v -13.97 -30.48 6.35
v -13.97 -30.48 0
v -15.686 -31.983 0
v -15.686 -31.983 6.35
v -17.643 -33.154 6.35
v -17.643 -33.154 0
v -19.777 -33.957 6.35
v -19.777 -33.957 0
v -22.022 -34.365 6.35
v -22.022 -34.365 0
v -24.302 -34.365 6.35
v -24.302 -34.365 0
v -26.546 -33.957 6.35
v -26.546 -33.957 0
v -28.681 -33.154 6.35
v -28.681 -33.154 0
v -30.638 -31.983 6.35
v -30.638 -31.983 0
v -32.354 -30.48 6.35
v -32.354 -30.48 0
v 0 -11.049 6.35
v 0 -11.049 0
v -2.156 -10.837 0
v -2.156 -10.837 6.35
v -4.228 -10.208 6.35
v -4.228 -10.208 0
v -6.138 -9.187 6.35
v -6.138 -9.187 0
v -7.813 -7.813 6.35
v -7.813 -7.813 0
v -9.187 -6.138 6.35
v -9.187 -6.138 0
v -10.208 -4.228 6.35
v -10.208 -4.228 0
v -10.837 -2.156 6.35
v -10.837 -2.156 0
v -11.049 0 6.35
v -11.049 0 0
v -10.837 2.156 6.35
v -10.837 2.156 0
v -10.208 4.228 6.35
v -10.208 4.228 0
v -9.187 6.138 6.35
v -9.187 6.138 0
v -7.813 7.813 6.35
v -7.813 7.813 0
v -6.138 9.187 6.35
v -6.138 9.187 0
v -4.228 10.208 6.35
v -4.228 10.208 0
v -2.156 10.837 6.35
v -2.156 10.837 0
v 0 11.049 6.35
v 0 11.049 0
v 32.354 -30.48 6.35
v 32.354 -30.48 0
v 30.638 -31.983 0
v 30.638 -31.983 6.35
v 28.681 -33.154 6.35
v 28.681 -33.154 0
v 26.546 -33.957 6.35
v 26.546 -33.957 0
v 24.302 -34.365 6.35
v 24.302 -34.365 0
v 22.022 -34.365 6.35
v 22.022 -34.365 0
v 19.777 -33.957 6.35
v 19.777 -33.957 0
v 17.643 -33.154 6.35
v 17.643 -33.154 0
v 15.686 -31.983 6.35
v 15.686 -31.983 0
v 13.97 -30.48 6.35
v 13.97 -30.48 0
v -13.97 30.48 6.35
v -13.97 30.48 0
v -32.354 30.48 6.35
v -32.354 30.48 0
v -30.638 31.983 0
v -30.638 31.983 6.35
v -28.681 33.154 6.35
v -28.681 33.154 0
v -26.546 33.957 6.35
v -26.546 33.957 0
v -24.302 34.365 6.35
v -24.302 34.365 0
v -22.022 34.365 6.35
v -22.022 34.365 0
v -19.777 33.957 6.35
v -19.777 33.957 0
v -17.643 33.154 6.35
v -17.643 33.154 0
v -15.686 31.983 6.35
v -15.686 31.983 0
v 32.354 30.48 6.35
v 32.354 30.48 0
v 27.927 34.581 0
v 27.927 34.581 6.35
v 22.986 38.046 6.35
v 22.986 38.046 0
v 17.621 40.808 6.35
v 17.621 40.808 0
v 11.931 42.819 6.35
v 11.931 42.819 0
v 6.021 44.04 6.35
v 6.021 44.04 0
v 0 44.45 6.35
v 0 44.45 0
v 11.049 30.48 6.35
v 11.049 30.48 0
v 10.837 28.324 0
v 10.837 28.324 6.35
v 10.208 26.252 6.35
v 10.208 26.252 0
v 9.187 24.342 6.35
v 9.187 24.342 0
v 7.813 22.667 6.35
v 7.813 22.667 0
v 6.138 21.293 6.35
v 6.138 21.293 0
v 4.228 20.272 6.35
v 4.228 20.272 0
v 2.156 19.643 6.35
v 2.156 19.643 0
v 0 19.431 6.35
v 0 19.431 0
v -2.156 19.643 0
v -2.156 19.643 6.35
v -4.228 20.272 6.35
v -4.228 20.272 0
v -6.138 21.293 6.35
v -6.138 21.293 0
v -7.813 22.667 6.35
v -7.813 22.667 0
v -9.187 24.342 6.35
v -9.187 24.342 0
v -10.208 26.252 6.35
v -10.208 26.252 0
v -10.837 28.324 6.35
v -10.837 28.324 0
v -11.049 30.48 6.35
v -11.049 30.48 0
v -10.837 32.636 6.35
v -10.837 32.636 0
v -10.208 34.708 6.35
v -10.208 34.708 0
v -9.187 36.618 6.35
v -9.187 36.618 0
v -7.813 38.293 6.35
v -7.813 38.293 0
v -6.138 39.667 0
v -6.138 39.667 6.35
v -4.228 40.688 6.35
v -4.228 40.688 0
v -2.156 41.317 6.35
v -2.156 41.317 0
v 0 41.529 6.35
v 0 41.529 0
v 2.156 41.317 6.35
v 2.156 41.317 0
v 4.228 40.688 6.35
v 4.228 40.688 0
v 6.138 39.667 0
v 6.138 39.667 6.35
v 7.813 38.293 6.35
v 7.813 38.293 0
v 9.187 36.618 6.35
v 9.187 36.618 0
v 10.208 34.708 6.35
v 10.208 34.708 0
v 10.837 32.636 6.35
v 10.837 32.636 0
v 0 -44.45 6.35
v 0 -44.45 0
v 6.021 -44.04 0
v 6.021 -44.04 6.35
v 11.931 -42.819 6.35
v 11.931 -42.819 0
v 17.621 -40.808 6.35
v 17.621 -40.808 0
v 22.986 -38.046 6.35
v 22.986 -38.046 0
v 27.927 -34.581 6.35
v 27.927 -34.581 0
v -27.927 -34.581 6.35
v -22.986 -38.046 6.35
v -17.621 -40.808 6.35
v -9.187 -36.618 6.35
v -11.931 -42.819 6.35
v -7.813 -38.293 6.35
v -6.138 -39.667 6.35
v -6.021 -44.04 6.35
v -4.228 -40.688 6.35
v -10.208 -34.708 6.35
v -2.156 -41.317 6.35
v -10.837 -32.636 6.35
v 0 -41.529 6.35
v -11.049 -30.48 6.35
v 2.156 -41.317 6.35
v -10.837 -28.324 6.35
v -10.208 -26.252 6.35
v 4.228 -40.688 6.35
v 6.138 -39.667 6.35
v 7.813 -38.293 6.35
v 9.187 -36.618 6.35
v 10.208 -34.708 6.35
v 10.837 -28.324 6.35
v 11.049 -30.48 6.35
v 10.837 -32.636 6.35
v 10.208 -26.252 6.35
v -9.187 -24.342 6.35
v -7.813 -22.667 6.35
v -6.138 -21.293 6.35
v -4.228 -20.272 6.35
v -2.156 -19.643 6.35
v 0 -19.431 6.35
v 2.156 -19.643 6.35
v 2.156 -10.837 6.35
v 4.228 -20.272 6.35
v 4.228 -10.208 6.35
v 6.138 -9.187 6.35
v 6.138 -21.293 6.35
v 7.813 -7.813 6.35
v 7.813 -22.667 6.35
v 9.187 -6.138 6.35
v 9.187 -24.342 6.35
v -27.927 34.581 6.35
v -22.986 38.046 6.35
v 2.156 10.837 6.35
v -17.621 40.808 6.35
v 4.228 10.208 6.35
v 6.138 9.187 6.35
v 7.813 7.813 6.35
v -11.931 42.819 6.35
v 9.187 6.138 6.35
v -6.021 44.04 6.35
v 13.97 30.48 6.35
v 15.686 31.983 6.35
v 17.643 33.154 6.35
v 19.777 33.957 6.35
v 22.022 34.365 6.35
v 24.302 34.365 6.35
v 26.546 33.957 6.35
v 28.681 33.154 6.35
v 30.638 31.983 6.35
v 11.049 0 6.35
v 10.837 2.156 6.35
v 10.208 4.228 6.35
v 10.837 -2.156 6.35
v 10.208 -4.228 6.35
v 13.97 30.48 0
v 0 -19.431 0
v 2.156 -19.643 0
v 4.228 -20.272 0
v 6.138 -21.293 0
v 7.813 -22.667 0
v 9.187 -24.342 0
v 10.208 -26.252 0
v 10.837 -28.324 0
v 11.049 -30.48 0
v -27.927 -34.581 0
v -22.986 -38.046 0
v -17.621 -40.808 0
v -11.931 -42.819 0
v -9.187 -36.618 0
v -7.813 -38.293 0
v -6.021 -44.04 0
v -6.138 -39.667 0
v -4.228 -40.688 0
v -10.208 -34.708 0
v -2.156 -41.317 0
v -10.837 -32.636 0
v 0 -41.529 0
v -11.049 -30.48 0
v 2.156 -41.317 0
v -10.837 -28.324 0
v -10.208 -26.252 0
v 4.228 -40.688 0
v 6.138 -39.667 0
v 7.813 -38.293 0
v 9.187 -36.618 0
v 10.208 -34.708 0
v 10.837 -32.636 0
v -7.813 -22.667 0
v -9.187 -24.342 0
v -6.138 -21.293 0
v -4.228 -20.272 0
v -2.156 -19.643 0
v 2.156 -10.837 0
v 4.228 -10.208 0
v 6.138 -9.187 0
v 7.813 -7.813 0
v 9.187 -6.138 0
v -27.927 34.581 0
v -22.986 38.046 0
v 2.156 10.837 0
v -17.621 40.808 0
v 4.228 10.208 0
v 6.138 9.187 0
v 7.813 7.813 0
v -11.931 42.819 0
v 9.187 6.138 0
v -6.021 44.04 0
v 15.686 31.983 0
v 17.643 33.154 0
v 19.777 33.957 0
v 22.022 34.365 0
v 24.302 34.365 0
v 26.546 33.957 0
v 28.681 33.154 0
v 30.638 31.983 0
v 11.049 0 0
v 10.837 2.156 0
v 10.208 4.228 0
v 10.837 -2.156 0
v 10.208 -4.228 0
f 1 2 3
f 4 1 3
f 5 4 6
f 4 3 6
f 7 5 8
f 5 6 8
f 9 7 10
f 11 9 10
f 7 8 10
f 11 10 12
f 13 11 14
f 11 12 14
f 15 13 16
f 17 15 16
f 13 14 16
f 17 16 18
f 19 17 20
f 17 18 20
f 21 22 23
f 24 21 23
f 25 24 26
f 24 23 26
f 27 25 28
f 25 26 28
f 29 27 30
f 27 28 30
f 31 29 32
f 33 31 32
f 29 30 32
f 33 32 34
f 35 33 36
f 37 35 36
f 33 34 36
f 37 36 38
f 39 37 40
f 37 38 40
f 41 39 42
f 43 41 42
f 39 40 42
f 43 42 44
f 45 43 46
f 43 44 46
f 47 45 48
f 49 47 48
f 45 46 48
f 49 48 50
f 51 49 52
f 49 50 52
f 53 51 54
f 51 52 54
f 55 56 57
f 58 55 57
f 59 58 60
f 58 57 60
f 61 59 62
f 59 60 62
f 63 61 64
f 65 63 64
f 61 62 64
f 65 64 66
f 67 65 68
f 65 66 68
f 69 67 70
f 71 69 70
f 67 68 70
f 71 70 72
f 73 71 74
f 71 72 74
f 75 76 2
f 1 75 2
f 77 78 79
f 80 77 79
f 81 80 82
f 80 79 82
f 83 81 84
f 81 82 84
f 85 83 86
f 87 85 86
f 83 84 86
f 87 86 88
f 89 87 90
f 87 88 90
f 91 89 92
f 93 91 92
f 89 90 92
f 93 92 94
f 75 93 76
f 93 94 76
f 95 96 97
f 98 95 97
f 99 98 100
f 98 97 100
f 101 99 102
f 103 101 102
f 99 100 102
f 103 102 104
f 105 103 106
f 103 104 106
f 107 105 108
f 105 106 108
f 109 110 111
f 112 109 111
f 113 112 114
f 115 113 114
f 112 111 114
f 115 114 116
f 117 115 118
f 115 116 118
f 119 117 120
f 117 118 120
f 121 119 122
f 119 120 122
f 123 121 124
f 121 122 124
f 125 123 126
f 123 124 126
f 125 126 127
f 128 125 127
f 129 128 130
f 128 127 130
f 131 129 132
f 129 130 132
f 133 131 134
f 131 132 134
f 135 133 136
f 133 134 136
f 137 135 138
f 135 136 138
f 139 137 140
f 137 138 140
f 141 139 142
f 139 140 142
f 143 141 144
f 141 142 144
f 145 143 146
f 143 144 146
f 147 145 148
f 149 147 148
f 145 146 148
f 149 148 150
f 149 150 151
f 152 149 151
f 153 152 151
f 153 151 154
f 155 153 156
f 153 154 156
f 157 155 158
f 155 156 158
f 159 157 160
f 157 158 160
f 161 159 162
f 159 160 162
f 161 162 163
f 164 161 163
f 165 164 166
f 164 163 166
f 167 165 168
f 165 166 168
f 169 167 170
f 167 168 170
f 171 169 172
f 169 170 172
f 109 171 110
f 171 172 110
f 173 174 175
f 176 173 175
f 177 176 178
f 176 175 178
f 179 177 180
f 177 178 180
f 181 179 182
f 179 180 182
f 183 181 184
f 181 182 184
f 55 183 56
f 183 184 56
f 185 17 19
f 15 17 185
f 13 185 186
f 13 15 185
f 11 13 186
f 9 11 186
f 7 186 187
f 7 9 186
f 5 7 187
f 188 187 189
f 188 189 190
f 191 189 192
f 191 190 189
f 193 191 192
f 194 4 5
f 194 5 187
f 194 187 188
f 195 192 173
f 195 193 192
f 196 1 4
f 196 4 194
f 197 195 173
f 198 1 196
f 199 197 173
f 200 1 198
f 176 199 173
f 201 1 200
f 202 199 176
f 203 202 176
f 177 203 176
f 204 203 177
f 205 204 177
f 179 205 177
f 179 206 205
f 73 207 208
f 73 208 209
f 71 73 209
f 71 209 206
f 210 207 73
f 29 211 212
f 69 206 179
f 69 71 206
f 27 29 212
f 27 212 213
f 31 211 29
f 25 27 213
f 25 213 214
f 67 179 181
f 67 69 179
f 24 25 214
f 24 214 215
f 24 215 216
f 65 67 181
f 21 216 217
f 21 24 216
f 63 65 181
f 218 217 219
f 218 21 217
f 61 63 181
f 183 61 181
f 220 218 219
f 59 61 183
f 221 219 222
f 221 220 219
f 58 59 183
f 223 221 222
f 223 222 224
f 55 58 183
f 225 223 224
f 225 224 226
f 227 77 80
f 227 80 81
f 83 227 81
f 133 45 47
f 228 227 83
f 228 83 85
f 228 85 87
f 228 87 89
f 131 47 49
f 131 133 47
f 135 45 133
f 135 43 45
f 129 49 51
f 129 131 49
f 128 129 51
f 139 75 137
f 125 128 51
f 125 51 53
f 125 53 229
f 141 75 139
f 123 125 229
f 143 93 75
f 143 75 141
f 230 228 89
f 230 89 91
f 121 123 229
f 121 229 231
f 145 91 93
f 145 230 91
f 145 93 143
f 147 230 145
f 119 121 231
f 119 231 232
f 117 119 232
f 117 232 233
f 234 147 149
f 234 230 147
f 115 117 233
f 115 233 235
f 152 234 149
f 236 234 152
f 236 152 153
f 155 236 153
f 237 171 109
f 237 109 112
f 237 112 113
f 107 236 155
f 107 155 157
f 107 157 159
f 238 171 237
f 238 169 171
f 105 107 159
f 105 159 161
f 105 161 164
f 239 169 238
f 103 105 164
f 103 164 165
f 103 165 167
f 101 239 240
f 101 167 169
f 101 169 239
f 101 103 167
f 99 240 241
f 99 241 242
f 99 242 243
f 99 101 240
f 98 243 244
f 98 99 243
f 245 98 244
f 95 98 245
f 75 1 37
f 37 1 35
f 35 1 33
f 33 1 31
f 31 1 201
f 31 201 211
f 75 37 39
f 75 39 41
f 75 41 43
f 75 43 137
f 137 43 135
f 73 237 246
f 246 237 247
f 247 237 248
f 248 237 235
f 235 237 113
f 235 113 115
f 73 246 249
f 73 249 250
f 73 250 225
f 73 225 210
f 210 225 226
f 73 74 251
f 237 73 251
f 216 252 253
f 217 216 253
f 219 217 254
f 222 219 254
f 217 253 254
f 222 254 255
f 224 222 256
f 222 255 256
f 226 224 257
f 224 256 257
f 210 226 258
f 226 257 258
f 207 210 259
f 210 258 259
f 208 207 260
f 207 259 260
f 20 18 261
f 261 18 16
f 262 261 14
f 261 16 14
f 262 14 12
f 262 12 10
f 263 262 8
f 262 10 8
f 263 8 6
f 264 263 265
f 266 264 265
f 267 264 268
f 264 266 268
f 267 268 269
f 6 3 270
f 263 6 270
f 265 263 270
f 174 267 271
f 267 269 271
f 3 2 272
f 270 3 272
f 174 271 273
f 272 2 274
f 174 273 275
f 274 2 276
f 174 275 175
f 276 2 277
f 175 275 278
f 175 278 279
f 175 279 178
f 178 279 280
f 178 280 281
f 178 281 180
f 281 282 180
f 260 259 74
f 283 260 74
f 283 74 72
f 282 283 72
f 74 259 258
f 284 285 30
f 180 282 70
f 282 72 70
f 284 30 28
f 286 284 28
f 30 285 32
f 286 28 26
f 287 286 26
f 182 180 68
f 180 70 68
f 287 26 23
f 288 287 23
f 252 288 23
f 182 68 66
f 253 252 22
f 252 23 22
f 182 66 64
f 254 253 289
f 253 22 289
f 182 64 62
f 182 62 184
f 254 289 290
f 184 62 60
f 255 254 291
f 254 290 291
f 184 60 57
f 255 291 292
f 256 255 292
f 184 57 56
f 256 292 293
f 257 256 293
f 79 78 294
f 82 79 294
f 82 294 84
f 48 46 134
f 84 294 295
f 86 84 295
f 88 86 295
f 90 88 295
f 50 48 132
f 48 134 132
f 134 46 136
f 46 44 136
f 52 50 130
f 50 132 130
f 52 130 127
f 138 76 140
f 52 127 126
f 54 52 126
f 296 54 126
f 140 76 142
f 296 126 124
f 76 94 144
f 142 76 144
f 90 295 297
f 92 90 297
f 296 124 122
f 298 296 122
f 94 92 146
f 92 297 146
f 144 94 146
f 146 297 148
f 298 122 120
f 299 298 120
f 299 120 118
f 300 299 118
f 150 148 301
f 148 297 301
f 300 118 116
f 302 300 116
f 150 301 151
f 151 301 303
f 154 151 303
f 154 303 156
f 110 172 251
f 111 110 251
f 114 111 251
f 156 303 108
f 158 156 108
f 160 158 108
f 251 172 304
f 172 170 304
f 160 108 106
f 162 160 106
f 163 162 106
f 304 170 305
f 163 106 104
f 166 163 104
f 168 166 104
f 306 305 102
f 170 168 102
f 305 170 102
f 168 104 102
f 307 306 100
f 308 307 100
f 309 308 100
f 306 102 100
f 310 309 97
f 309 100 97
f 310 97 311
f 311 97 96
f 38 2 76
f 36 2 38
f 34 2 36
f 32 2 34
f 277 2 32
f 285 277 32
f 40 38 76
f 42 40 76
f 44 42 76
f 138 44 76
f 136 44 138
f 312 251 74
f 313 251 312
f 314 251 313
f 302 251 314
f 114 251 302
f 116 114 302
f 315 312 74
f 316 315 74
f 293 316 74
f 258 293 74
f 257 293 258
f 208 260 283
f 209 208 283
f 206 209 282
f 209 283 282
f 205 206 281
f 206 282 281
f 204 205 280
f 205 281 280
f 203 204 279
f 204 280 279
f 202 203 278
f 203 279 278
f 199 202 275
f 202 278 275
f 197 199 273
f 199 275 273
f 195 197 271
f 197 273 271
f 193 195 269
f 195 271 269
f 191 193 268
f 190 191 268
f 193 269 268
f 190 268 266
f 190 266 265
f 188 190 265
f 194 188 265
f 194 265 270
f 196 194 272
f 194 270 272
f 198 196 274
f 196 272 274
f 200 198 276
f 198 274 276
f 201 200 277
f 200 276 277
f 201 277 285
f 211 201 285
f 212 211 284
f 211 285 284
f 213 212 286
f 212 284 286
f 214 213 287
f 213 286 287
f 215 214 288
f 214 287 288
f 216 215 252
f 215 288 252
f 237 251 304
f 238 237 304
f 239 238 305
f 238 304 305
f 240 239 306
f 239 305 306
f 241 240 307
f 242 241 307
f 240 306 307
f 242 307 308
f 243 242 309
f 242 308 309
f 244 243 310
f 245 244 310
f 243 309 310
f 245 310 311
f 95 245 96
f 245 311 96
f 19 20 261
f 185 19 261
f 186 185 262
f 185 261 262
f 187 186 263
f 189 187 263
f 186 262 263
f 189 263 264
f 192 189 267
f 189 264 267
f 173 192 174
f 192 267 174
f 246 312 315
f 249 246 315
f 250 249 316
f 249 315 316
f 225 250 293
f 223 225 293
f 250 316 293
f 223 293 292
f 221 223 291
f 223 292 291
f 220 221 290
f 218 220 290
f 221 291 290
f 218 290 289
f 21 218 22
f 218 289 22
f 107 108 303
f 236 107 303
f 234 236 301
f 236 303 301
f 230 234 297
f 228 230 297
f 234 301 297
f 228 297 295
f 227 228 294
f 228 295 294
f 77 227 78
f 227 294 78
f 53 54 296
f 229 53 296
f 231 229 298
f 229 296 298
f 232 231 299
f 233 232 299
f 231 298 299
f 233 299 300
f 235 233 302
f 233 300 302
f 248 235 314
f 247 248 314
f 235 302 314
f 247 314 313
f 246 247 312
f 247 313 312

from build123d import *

# Parameters (mm, degrees)
F1_DEPTH = 6.35


with BuildPart() as f1:
    # F0 (on Top) → F1 (new body)
    with BuildSketch(Plane.XY):
        with BuildLine():
            ThreePointArc((0, 11.049), (7.8128228253, 7.8128228253), (11.049, 0))
            ThreePointArc((11.049, 0), (7.8128228253, -7.8128228253), (0, -11.049))
            Line((0, -11.049), (0, -13.97))
            ThreePointArc((0, -13.97), (9.8782817332, -9.8782817332), (13.97, 0))
            ThreePointArc((13.97, 0), (9.8782817332, 9.8782817332), (0, 13.97))
            Line((0, 13.97), (0, 11.049))
        make_face()
        with BuildLine():
            ThreePointArc((0, -11.049), (-11.049, 0), (0, 11.049))
            Line((0, 11.049), (0, 13.97))
            ThreePointArc((0, 13.97), (-9.8782817332, 9.8782817332), (-13.97, 0))
            ThreePointArc((-13.97, 0), (-9.8782817332, -9.8782817332), (0, -13.97))
            Line((0, -13.97), (0, -11.049))
        make_face()
        with BuildLine():
            Line((0, 16.51), (0, 13.97))
            ThreePointArc((0, 13.97), (9.8782817332, 9.8782817332), (13.97, 0))
            Line((13.97, 0), (13.97, 30.48))
            ThreePointArc((13.97, 30.48), (9.8782817332, 20.6017182668), (0, 16.51))
        make_face()
        with BuildLine():
            ThreePointArc((-13.97, 0), (-9.8782817332, 9.8782817332), (0, 13.97))
            Line((0, 13.97), (0, 16.51))
            ThreePointArc((0, 16.51), (-9.8782817332, 20.6017182668), (-13.97, 30.48))
            Line((-13.97, 30.48), (-13.97, 0))
        make_face()
        with BuildLine():
            Line((0, -16.51), (0, -13.97))
            ThreePointArc((0, -13.97), (-9.8782817332, -9.8782817332), (-13.97, 0))
            Line((-13.97, 0), (-13.97, -30.48))
            ThreePointArc((-13.97, -30.48), (-9.8782817332, -20.6017182668), (0, -16.51))
        make_face()
        with BuildLine():
            ThreePointArc((13.97, 0), (9.8782817332, -9.8782817332), (0, -13.97))
            Line((0, -13.97), (0, -16.51))
            ThreePointArc((0, -16.51), (9.8782817332, -20.6017182668), (13.97, -30.48))
            Line((13.97, -30.48), (13.97, 0))
        make_face()
        with BuildLine():
            ThreePointArc((-13.97, 30.48), (-9.8782817332, 20.6017182668), (0, 16.51))
            ThreePointArc((0, 16.51), (9.8782817332, 20.6017182668), (13.97, 30.48))
            ThreePointArc((13.97, 30.48), (9.8782817459, 40.3582817204), (3.6e-08, 44.45))
            ThreePointArc((3.6e-08, 44.45), (-9.8782817204, 40.3582817459), (-13.97, 30.48))
        make_face()
        with BuildLine():
            ThreePointArc((11.049, 30.48), (7.8128228253, 22.6671771747), (0, 19.431))
            ThreePointArc((0, 19.431), (-7.8128228253, 38.2928228253), (11.049, 30.48))
        make_face(mode=Mode.SUBTRACT)
        with BuildLine():
            ThreePointArc((13.97, -30.48), (9.8782817332, -20.6017182668), (0, -16.51))
            ThreePointArc((0, -16.51), (-9.8782817332, -20.6017182668), (-13.97, -30.48))
            ThreePointArc((-13.97, -30.48), (-9.8782817062, -40.3582817602), (7.63e-08, -44.45))
            ThreePointArc((7.63e-08, -44.45), (9.8782817602, -40.3582817062), (13.97, -30.48))
        make_face()
        with BuildLine():
            ThreePointArc((11.049, -30.48), (-7.8128228253, -38.2928228253), (0, -19.431))
            ThreePointArc((0, -19.431), (7.8128228253, -22.6671771747), (11.049, -30.48))
        make_face(mode=Mode.SUBTRACT)
        with BuildLine():
            ThreePointArc((3.6e-08, 44.45), (9.8782817459, 40.3582817204), (13.97, 30.48))
            ThreePointArc((13.97, 30.48), (23.1619287876, 34.4165277907), (32.3538575753, 30.48))
            ThreePointArc((32.3538575753, 30.48), (17.6205349119, 40.808323286), (3.6e-08, 44.45))
        make_face()
        with BuildLine():
            ThreePointArc((32.3538575753, -30.48), (23.1619287876, -34.4165277907), (13.97, -30.48))
            ThreePointArc((13.97, -30.48), (9.8782817602, -40.3582817062), (7.63e-08, -44.45))
            ThreePointArc((7.63e-08, -44.45), (17.6205349304, -40.808323278), (32.3538575753, -30.48))
        make_face()
        with BuildLine():
            ThreePointArc((7.63e-08, -44.45), (-9.8782817062, -40.3582817602), (-13.97, -30.48))
            ThreePointArc((-13.97, -30.48), (-23.1619287876, -34.4165277907), (-32.3538575753, -30.48))
            ThreePointArc((-32.3538575753, -30.48), (-17.6205348604, -40.8083233083), (7.63e-08, -44.45))
        make_face()
        with BuildLine():
            ThreePointArc((-32.3538575753, 30.48), (-23.1619287876, 34.4165277907), (-13.97, 30.48))
            ThreePointArc((-13.97, 30.48), (-9.8782817204, 40.3582817459), (3.6e-08, 44.45))
            ThreePointArc((3.6e-08, 44.45), (-17.6205348789, 40.8083233003), (-32.3538575753, 30.48))
        make_face()
    extrude(amount=F1_DEPTH)


solid = f1.part
